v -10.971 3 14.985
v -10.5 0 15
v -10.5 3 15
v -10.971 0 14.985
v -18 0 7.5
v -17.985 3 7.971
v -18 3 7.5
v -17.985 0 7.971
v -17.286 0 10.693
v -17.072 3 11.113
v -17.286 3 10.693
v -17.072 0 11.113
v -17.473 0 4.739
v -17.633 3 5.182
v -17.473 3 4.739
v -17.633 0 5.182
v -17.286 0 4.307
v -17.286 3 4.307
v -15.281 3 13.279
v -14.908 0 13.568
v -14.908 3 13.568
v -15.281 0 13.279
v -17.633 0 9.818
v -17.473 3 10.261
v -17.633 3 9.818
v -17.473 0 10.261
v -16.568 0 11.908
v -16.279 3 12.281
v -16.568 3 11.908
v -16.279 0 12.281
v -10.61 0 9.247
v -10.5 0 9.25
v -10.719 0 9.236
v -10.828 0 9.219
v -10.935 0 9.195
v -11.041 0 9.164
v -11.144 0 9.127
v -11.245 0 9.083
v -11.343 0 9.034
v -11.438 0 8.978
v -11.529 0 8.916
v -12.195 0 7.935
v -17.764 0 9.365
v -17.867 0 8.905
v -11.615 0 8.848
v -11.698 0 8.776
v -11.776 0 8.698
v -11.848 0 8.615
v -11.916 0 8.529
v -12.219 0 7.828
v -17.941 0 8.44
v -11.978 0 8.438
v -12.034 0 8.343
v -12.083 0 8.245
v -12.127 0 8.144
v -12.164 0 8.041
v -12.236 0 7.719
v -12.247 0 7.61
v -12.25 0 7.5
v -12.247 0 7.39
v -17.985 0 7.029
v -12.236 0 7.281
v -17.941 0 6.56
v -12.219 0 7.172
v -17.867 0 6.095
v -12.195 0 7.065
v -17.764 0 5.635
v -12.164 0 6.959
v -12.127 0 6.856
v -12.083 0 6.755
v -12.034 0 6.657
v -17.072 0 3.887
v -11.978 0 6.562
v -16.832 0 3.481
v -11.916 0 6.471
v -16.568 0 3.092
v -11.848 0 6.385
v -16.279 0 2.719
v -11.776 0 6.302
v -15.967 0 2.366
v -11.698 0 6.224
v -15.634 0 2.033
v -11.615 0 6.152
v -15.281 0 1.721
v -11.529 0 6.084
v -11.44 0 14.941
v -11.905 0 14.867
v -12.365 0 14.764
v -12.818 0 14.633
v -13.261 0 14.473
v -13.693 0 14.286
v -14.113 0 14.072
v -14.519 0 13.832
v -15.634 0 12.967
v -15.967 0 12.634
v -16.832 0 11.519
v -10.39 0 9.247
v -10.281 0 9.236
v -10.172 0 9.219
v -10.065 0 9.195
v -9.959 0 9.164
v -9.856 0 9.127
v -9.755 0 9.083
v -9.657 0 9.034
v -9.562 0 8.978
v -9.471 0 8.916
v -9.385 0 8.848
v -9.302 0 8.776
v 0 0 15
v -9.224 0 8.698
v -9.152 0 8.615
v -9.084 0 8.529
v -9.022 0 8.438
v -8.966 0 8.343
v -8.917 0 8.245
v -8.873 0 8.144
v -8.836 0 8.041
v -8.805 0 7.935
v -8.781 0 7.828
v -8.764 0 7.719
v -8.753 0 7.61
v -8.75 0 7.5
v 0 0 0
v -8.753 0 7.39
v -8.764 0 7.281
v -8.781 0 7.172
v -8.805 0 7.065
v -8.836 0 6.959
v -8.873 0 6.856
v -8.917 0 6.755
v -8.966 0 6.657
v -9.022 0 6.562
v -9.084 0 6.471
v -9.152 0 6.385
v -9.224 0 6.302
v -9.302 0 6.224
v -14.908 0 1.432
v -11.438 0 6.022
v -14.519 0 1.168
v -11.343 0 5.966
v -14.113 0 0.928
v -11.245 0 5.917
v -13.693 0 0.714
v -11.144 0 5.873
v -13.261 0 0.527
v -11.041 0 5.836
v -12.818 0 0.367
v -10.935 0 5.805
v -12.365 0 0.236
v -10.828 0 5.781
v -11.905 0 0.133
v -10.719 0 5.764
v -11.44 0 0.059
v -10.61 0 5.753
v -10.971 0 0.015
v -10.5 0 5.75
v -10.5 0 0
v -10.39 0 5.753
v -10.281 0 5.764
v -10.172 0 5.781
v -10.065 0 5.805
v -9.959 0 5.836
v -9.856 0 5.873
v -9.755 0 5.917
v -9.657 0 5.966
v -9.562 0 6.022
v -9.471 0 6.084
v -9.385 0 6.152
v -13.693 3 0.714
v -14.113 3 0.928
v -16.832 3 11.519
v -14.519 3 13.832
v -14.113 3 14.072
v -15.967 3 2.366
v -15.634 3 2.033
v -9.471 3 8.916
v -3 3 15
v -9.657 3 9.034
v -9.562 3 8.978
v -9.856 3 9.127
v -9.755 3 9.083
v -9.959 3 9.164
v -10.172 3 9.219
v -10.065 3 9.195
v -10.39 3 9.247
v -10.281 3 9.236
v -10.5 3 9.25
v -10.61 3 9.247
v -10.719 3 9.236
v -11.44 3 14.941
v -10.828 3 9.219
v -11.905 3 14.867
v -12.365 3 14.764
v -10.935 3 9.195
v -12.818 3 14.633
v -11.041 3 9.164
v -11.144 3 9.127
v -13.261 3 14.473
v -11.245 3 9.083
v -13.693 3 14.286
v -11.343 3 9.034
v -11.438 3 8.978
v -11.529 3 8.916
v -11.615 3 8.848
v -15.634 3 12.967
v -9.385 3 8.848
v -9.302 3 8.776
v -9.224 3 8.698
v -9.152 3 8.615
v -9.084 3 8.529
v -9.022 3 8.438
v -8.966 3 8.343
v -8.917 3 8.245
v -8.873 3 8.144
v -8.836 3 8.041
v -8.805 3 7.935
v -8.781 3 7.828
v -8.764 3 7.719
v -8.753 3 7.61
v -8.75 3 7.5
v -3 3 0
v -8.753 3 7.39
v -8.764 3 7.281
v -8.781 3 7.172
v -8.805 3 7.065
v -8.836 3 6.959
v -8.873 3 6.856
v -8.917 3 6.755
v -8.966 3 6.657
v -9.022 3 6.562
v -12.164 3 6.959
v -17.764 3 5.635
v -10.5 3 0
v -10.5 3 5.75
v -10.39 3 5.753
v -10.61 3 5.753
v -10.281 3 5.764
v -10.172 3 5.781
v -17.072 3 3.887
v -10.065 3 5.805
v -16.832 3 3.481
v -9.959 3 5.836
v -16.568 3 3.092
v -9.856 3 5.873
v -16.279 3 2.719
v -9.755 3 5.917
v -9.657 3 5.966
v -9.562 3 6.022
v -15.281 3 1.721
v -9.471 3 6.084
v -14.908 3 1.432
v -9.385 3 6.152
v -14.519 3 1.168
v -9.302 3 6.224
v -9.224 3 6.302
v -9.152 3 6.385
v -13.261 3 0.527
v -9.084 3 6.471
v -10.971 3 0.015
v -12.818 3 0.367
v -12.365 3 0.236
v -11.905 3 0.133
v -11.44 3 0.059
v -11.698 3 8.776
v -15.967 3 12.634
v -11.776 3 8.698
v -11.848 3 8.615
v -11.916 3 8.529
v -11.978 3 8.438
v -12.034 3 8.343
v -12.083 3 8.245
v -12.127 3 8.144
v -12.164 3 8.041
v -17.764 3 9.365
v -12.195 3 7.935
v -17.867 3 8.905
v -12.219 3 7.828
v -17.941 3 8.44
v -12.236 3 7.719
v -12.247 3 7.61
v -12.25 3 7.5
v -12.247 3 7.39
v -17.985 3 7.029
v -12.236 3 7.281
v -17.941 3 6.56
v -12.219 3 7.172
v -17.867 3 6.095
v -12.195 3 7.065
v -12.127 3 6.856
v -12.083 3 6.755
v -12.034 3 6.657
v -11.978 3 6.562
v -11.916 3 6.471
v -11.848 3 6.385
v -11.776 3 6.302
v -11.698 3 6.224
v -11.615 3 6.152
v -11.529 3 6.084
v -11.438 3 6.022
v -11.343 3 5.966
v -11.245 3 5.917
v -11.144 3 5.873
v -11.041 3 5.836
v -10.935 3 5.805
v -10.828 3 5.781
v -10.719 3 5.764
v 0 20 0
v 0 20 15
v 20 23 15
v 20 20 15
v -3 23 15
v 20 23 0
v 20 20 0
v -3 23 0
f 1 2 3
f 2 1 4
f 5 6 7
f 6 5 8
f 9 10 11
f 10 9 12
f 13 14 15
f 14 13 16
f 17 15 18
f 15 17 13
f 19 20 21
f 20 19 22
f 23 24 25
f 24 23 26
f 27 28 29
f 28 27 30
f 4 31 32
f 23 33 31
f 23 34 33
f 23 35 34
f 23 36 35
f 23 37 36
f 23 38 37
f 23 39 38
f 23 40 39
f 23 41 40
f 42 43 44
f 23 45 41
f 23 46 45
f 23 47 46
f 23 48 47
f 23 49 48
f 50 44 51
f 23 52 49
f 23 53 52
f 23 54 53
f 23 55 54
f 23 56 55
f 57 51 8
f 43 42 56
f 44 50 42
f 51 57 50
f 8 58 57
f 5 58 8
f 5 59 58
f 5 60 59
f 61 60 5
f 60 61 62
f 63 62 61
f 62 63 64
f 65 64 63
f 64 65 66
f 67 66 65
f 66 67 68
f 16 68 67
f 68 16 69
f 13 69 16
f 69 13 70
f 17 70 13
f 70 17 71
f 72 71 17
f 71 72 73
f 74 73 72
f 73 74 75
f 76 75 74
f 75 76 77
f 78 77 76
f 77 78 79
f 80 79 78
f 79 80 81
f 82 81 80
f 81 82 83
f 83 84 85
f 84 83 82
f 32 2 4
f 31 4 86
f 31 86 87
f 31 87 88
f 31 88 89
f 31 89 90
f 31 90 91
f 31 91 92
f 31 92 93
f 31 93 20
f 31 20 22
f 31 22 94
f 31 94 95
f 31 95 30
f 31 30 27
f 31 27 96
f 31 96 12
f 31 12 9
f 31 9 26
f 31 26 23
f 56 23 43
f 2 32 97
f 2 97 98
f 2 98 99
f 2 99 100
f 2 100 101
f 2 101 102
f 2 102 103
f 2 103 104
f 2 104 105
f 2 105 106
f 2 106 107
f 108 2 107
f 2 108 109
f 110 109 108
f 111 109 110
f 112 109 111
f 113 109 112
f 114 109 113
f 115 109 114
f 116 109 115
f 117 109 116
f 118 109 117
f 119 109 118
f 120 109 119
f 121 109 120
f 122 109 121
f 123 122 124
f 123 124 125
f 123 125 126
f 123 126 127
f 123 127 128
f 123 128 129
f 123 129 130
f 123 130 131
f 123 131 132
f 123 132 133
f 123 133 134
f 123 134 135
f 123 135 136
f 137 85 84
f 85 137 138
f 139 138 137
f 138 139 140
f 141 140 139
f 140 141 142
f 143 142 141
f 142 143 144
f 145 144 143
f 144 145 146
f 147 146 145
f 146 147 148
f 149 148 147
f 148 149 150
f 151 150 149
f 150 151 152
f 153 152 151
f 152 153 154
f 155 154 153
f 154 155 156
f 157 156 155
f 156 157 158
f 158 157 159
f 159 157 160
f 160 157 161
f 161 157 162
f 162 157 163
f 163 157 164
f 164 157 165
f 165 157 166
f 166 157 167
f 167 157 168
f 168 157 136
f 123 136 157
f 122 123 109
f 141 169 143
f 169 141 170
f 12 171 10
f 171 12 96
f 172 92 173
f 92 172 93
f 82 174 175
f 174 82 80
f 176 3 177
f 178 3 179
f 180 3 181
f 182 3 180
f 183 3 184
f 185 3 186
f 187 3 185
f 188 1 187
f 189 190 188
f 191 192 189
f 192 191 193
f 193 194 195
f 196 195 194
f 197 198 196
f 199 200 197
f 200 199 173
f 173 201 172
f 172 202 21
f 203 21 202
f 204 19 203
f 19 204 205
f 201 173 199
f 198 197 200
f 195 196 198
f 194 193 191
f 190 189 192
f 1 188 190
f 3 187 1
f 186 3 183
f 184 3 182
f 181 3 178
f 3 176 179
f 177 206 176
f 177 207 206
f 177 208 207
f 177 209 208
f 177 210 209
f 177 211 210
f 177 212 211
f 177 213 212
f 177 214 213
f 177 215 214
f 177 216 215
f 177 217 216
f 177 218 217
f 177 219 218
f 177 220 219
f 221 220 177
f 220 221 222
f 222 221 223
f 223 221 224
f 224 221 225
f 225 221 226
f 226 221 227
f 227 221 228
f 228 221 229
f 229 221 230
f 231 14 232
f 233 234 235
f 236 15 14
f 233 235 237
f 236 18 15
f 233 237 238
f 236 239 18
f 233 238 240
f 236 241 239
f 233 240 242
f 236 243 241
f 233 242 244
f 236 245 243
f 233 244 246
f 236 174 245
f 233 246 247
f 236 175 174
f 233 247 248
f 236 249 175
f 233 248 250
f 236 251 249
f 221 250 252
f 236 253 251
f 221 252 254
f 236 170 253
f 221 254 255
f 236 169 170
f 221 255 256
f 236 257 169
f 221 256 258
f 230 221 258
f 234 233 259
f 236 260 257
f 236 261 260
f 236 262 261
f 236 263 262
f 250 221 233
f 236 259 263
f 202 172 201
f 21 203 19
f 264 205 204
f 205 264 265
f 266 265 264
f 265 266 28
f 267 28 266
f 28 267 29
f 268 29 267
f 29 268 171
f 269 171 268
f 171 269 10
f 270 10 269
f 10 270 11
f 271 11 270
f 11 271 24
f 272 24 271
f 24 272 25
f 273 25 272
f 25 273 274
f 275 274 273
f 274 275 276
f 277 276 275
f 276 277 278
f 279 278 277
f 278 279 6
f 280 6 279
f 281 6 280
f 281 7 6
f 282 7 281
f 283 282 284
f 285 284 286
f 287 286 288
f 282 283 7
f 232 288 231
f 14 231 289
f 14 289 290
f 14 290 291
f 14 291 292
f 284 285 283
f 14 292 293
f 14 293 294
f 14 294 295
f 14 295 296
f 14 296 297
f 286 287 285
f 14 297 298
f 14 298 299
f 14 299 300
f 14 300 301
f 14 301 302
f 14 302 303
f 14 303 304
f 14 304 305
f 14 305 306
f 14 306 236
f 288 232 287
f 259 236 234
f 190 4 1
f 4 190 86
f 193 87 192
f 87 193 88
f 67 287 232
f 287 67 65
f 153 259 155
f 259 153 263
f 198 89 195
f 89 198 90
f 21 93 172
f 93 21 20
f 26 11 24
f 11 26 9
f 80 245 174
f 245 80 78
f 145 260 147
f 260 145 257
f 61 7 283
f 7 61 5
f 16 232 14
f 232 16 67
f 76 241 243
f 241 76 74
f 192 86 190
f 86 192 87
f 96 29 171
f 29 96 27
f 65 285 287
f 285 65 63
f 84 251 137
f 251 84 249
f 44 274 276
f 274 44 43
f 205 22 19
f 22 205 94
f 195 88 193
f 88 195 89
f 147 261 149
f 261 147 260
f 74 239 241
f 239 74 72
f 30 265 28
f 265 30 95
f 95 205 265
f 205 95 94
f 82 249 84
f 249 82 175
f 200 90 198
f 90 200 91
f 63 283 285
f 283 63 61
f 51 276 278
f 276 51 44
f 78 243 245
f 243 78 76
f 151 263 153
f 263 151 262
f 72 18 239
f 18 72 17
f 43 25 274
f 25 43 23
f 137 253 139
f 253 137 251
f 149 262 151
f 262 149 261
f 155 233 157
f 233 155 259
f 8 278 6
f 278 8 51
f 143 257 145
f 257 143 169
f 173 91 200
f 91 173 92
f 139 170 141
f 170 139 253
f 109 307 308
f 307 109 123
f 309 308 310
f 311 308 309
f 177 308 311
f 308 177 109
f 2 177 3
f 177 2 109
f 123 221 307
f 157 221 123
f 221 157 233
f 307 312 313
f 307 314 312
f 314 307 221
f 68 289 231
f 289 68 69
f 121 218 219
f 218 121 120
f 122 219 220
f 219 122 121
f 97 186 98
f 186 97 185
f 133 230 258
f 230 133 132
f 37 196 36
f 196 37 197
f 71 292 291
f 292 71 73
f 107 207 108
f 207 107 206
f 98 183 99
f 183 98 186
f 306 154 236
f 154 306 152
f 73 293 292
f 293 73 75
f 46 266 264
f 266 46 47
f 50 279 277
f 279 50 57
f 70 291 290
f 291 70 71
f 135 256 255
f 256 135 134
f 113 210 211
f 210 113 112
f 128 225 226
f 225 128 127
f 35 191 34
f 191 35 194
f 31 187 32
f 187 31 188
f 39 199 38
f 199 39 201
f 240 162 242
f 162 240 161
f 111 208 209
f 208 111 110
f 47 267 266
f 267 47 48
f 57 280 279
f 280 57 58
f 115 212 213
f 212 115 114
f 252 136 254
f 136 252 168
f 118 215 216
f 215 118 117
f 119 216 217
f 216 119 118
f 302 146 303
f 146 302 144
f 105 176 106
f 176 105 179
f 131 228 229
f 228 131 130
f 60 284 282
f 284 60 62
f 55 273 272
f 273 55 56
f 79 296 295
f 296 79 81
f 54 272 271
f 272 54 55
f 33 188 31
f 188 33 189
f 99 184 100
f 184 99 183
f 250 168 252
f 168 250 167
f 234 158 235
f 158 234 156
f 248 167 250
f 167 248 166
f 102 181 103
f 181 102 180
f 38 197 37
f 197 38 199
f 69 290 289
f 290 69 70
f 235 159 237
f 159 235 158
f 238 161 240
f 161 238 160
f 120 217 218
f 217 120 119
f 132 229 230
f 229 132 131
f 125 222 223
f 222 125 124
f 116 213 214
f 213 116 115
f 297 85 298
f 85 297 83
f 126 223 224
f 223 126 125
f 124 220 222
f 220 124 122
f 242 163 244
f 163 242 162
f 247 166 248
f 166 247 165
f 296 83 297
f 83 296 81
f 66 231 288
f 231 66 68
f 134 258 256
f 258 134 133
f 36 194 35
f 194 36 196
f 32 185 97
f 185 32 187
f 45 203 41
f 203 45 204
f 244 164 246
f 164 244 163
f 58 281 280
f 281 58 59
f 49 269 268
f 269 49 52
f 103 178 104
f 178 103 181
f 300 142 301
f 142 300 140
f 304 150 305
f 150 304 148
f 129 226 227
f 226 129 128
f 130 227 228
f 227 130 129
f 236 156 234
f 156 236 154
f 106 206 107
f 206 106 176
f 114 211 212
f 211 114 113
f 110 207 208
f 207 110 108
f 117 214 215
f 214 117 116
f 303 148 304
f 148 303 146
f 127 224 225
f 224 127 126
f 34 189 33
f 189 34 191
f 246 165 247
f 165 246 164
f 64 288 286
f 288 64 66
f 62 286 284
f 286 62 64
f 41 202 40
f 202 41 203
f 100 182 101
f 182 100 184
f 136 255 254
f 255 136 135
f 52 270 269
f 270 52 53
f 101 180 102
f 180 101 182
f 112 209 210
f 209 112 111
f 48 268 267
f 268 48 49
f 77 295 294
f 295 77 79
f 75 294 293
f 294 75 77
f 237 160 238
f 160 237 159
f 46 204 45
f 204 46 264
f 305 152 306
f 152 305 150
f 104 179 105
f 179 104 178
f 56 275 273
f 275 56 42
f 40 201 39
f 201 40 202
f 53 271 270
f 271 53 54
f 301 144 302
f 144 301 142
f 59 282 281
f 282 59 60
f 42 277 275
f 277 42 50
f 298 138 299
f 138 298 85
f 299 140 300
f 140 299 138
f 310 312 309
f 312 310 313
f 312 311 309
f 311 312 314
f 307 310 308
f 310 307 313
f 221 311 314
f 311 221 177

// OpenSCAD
// height of the object you want to clamp
hook_height = 20; // [1:100]
// length of the clamp/grip
hook_length = 20; // [5:50]

translate([-3,3,0]) hook(hook_height,hook_length);

module hook (height, length)
{
    color("red") translate([3,height-3,0]) cube([length,3,15]);
    
    color("green") cube([3,height,15]);

    translate([-15,-3,0]) difference()
    {
        translate([7.5,1.5,7.5])        rounded();
        translate([7.5,0,7.5]) rotate ([90,0,0]) cylinder (h=8, r=1.75, center = true, $fn=100);
    }
}
module rounded()
{
    rotate ([90,0,0]) cylinder (h=3, r=7.5, center = true, $fn=100);
    translate([0,-1.5,-7.50]) cube([10.5,3,15]);
 }
